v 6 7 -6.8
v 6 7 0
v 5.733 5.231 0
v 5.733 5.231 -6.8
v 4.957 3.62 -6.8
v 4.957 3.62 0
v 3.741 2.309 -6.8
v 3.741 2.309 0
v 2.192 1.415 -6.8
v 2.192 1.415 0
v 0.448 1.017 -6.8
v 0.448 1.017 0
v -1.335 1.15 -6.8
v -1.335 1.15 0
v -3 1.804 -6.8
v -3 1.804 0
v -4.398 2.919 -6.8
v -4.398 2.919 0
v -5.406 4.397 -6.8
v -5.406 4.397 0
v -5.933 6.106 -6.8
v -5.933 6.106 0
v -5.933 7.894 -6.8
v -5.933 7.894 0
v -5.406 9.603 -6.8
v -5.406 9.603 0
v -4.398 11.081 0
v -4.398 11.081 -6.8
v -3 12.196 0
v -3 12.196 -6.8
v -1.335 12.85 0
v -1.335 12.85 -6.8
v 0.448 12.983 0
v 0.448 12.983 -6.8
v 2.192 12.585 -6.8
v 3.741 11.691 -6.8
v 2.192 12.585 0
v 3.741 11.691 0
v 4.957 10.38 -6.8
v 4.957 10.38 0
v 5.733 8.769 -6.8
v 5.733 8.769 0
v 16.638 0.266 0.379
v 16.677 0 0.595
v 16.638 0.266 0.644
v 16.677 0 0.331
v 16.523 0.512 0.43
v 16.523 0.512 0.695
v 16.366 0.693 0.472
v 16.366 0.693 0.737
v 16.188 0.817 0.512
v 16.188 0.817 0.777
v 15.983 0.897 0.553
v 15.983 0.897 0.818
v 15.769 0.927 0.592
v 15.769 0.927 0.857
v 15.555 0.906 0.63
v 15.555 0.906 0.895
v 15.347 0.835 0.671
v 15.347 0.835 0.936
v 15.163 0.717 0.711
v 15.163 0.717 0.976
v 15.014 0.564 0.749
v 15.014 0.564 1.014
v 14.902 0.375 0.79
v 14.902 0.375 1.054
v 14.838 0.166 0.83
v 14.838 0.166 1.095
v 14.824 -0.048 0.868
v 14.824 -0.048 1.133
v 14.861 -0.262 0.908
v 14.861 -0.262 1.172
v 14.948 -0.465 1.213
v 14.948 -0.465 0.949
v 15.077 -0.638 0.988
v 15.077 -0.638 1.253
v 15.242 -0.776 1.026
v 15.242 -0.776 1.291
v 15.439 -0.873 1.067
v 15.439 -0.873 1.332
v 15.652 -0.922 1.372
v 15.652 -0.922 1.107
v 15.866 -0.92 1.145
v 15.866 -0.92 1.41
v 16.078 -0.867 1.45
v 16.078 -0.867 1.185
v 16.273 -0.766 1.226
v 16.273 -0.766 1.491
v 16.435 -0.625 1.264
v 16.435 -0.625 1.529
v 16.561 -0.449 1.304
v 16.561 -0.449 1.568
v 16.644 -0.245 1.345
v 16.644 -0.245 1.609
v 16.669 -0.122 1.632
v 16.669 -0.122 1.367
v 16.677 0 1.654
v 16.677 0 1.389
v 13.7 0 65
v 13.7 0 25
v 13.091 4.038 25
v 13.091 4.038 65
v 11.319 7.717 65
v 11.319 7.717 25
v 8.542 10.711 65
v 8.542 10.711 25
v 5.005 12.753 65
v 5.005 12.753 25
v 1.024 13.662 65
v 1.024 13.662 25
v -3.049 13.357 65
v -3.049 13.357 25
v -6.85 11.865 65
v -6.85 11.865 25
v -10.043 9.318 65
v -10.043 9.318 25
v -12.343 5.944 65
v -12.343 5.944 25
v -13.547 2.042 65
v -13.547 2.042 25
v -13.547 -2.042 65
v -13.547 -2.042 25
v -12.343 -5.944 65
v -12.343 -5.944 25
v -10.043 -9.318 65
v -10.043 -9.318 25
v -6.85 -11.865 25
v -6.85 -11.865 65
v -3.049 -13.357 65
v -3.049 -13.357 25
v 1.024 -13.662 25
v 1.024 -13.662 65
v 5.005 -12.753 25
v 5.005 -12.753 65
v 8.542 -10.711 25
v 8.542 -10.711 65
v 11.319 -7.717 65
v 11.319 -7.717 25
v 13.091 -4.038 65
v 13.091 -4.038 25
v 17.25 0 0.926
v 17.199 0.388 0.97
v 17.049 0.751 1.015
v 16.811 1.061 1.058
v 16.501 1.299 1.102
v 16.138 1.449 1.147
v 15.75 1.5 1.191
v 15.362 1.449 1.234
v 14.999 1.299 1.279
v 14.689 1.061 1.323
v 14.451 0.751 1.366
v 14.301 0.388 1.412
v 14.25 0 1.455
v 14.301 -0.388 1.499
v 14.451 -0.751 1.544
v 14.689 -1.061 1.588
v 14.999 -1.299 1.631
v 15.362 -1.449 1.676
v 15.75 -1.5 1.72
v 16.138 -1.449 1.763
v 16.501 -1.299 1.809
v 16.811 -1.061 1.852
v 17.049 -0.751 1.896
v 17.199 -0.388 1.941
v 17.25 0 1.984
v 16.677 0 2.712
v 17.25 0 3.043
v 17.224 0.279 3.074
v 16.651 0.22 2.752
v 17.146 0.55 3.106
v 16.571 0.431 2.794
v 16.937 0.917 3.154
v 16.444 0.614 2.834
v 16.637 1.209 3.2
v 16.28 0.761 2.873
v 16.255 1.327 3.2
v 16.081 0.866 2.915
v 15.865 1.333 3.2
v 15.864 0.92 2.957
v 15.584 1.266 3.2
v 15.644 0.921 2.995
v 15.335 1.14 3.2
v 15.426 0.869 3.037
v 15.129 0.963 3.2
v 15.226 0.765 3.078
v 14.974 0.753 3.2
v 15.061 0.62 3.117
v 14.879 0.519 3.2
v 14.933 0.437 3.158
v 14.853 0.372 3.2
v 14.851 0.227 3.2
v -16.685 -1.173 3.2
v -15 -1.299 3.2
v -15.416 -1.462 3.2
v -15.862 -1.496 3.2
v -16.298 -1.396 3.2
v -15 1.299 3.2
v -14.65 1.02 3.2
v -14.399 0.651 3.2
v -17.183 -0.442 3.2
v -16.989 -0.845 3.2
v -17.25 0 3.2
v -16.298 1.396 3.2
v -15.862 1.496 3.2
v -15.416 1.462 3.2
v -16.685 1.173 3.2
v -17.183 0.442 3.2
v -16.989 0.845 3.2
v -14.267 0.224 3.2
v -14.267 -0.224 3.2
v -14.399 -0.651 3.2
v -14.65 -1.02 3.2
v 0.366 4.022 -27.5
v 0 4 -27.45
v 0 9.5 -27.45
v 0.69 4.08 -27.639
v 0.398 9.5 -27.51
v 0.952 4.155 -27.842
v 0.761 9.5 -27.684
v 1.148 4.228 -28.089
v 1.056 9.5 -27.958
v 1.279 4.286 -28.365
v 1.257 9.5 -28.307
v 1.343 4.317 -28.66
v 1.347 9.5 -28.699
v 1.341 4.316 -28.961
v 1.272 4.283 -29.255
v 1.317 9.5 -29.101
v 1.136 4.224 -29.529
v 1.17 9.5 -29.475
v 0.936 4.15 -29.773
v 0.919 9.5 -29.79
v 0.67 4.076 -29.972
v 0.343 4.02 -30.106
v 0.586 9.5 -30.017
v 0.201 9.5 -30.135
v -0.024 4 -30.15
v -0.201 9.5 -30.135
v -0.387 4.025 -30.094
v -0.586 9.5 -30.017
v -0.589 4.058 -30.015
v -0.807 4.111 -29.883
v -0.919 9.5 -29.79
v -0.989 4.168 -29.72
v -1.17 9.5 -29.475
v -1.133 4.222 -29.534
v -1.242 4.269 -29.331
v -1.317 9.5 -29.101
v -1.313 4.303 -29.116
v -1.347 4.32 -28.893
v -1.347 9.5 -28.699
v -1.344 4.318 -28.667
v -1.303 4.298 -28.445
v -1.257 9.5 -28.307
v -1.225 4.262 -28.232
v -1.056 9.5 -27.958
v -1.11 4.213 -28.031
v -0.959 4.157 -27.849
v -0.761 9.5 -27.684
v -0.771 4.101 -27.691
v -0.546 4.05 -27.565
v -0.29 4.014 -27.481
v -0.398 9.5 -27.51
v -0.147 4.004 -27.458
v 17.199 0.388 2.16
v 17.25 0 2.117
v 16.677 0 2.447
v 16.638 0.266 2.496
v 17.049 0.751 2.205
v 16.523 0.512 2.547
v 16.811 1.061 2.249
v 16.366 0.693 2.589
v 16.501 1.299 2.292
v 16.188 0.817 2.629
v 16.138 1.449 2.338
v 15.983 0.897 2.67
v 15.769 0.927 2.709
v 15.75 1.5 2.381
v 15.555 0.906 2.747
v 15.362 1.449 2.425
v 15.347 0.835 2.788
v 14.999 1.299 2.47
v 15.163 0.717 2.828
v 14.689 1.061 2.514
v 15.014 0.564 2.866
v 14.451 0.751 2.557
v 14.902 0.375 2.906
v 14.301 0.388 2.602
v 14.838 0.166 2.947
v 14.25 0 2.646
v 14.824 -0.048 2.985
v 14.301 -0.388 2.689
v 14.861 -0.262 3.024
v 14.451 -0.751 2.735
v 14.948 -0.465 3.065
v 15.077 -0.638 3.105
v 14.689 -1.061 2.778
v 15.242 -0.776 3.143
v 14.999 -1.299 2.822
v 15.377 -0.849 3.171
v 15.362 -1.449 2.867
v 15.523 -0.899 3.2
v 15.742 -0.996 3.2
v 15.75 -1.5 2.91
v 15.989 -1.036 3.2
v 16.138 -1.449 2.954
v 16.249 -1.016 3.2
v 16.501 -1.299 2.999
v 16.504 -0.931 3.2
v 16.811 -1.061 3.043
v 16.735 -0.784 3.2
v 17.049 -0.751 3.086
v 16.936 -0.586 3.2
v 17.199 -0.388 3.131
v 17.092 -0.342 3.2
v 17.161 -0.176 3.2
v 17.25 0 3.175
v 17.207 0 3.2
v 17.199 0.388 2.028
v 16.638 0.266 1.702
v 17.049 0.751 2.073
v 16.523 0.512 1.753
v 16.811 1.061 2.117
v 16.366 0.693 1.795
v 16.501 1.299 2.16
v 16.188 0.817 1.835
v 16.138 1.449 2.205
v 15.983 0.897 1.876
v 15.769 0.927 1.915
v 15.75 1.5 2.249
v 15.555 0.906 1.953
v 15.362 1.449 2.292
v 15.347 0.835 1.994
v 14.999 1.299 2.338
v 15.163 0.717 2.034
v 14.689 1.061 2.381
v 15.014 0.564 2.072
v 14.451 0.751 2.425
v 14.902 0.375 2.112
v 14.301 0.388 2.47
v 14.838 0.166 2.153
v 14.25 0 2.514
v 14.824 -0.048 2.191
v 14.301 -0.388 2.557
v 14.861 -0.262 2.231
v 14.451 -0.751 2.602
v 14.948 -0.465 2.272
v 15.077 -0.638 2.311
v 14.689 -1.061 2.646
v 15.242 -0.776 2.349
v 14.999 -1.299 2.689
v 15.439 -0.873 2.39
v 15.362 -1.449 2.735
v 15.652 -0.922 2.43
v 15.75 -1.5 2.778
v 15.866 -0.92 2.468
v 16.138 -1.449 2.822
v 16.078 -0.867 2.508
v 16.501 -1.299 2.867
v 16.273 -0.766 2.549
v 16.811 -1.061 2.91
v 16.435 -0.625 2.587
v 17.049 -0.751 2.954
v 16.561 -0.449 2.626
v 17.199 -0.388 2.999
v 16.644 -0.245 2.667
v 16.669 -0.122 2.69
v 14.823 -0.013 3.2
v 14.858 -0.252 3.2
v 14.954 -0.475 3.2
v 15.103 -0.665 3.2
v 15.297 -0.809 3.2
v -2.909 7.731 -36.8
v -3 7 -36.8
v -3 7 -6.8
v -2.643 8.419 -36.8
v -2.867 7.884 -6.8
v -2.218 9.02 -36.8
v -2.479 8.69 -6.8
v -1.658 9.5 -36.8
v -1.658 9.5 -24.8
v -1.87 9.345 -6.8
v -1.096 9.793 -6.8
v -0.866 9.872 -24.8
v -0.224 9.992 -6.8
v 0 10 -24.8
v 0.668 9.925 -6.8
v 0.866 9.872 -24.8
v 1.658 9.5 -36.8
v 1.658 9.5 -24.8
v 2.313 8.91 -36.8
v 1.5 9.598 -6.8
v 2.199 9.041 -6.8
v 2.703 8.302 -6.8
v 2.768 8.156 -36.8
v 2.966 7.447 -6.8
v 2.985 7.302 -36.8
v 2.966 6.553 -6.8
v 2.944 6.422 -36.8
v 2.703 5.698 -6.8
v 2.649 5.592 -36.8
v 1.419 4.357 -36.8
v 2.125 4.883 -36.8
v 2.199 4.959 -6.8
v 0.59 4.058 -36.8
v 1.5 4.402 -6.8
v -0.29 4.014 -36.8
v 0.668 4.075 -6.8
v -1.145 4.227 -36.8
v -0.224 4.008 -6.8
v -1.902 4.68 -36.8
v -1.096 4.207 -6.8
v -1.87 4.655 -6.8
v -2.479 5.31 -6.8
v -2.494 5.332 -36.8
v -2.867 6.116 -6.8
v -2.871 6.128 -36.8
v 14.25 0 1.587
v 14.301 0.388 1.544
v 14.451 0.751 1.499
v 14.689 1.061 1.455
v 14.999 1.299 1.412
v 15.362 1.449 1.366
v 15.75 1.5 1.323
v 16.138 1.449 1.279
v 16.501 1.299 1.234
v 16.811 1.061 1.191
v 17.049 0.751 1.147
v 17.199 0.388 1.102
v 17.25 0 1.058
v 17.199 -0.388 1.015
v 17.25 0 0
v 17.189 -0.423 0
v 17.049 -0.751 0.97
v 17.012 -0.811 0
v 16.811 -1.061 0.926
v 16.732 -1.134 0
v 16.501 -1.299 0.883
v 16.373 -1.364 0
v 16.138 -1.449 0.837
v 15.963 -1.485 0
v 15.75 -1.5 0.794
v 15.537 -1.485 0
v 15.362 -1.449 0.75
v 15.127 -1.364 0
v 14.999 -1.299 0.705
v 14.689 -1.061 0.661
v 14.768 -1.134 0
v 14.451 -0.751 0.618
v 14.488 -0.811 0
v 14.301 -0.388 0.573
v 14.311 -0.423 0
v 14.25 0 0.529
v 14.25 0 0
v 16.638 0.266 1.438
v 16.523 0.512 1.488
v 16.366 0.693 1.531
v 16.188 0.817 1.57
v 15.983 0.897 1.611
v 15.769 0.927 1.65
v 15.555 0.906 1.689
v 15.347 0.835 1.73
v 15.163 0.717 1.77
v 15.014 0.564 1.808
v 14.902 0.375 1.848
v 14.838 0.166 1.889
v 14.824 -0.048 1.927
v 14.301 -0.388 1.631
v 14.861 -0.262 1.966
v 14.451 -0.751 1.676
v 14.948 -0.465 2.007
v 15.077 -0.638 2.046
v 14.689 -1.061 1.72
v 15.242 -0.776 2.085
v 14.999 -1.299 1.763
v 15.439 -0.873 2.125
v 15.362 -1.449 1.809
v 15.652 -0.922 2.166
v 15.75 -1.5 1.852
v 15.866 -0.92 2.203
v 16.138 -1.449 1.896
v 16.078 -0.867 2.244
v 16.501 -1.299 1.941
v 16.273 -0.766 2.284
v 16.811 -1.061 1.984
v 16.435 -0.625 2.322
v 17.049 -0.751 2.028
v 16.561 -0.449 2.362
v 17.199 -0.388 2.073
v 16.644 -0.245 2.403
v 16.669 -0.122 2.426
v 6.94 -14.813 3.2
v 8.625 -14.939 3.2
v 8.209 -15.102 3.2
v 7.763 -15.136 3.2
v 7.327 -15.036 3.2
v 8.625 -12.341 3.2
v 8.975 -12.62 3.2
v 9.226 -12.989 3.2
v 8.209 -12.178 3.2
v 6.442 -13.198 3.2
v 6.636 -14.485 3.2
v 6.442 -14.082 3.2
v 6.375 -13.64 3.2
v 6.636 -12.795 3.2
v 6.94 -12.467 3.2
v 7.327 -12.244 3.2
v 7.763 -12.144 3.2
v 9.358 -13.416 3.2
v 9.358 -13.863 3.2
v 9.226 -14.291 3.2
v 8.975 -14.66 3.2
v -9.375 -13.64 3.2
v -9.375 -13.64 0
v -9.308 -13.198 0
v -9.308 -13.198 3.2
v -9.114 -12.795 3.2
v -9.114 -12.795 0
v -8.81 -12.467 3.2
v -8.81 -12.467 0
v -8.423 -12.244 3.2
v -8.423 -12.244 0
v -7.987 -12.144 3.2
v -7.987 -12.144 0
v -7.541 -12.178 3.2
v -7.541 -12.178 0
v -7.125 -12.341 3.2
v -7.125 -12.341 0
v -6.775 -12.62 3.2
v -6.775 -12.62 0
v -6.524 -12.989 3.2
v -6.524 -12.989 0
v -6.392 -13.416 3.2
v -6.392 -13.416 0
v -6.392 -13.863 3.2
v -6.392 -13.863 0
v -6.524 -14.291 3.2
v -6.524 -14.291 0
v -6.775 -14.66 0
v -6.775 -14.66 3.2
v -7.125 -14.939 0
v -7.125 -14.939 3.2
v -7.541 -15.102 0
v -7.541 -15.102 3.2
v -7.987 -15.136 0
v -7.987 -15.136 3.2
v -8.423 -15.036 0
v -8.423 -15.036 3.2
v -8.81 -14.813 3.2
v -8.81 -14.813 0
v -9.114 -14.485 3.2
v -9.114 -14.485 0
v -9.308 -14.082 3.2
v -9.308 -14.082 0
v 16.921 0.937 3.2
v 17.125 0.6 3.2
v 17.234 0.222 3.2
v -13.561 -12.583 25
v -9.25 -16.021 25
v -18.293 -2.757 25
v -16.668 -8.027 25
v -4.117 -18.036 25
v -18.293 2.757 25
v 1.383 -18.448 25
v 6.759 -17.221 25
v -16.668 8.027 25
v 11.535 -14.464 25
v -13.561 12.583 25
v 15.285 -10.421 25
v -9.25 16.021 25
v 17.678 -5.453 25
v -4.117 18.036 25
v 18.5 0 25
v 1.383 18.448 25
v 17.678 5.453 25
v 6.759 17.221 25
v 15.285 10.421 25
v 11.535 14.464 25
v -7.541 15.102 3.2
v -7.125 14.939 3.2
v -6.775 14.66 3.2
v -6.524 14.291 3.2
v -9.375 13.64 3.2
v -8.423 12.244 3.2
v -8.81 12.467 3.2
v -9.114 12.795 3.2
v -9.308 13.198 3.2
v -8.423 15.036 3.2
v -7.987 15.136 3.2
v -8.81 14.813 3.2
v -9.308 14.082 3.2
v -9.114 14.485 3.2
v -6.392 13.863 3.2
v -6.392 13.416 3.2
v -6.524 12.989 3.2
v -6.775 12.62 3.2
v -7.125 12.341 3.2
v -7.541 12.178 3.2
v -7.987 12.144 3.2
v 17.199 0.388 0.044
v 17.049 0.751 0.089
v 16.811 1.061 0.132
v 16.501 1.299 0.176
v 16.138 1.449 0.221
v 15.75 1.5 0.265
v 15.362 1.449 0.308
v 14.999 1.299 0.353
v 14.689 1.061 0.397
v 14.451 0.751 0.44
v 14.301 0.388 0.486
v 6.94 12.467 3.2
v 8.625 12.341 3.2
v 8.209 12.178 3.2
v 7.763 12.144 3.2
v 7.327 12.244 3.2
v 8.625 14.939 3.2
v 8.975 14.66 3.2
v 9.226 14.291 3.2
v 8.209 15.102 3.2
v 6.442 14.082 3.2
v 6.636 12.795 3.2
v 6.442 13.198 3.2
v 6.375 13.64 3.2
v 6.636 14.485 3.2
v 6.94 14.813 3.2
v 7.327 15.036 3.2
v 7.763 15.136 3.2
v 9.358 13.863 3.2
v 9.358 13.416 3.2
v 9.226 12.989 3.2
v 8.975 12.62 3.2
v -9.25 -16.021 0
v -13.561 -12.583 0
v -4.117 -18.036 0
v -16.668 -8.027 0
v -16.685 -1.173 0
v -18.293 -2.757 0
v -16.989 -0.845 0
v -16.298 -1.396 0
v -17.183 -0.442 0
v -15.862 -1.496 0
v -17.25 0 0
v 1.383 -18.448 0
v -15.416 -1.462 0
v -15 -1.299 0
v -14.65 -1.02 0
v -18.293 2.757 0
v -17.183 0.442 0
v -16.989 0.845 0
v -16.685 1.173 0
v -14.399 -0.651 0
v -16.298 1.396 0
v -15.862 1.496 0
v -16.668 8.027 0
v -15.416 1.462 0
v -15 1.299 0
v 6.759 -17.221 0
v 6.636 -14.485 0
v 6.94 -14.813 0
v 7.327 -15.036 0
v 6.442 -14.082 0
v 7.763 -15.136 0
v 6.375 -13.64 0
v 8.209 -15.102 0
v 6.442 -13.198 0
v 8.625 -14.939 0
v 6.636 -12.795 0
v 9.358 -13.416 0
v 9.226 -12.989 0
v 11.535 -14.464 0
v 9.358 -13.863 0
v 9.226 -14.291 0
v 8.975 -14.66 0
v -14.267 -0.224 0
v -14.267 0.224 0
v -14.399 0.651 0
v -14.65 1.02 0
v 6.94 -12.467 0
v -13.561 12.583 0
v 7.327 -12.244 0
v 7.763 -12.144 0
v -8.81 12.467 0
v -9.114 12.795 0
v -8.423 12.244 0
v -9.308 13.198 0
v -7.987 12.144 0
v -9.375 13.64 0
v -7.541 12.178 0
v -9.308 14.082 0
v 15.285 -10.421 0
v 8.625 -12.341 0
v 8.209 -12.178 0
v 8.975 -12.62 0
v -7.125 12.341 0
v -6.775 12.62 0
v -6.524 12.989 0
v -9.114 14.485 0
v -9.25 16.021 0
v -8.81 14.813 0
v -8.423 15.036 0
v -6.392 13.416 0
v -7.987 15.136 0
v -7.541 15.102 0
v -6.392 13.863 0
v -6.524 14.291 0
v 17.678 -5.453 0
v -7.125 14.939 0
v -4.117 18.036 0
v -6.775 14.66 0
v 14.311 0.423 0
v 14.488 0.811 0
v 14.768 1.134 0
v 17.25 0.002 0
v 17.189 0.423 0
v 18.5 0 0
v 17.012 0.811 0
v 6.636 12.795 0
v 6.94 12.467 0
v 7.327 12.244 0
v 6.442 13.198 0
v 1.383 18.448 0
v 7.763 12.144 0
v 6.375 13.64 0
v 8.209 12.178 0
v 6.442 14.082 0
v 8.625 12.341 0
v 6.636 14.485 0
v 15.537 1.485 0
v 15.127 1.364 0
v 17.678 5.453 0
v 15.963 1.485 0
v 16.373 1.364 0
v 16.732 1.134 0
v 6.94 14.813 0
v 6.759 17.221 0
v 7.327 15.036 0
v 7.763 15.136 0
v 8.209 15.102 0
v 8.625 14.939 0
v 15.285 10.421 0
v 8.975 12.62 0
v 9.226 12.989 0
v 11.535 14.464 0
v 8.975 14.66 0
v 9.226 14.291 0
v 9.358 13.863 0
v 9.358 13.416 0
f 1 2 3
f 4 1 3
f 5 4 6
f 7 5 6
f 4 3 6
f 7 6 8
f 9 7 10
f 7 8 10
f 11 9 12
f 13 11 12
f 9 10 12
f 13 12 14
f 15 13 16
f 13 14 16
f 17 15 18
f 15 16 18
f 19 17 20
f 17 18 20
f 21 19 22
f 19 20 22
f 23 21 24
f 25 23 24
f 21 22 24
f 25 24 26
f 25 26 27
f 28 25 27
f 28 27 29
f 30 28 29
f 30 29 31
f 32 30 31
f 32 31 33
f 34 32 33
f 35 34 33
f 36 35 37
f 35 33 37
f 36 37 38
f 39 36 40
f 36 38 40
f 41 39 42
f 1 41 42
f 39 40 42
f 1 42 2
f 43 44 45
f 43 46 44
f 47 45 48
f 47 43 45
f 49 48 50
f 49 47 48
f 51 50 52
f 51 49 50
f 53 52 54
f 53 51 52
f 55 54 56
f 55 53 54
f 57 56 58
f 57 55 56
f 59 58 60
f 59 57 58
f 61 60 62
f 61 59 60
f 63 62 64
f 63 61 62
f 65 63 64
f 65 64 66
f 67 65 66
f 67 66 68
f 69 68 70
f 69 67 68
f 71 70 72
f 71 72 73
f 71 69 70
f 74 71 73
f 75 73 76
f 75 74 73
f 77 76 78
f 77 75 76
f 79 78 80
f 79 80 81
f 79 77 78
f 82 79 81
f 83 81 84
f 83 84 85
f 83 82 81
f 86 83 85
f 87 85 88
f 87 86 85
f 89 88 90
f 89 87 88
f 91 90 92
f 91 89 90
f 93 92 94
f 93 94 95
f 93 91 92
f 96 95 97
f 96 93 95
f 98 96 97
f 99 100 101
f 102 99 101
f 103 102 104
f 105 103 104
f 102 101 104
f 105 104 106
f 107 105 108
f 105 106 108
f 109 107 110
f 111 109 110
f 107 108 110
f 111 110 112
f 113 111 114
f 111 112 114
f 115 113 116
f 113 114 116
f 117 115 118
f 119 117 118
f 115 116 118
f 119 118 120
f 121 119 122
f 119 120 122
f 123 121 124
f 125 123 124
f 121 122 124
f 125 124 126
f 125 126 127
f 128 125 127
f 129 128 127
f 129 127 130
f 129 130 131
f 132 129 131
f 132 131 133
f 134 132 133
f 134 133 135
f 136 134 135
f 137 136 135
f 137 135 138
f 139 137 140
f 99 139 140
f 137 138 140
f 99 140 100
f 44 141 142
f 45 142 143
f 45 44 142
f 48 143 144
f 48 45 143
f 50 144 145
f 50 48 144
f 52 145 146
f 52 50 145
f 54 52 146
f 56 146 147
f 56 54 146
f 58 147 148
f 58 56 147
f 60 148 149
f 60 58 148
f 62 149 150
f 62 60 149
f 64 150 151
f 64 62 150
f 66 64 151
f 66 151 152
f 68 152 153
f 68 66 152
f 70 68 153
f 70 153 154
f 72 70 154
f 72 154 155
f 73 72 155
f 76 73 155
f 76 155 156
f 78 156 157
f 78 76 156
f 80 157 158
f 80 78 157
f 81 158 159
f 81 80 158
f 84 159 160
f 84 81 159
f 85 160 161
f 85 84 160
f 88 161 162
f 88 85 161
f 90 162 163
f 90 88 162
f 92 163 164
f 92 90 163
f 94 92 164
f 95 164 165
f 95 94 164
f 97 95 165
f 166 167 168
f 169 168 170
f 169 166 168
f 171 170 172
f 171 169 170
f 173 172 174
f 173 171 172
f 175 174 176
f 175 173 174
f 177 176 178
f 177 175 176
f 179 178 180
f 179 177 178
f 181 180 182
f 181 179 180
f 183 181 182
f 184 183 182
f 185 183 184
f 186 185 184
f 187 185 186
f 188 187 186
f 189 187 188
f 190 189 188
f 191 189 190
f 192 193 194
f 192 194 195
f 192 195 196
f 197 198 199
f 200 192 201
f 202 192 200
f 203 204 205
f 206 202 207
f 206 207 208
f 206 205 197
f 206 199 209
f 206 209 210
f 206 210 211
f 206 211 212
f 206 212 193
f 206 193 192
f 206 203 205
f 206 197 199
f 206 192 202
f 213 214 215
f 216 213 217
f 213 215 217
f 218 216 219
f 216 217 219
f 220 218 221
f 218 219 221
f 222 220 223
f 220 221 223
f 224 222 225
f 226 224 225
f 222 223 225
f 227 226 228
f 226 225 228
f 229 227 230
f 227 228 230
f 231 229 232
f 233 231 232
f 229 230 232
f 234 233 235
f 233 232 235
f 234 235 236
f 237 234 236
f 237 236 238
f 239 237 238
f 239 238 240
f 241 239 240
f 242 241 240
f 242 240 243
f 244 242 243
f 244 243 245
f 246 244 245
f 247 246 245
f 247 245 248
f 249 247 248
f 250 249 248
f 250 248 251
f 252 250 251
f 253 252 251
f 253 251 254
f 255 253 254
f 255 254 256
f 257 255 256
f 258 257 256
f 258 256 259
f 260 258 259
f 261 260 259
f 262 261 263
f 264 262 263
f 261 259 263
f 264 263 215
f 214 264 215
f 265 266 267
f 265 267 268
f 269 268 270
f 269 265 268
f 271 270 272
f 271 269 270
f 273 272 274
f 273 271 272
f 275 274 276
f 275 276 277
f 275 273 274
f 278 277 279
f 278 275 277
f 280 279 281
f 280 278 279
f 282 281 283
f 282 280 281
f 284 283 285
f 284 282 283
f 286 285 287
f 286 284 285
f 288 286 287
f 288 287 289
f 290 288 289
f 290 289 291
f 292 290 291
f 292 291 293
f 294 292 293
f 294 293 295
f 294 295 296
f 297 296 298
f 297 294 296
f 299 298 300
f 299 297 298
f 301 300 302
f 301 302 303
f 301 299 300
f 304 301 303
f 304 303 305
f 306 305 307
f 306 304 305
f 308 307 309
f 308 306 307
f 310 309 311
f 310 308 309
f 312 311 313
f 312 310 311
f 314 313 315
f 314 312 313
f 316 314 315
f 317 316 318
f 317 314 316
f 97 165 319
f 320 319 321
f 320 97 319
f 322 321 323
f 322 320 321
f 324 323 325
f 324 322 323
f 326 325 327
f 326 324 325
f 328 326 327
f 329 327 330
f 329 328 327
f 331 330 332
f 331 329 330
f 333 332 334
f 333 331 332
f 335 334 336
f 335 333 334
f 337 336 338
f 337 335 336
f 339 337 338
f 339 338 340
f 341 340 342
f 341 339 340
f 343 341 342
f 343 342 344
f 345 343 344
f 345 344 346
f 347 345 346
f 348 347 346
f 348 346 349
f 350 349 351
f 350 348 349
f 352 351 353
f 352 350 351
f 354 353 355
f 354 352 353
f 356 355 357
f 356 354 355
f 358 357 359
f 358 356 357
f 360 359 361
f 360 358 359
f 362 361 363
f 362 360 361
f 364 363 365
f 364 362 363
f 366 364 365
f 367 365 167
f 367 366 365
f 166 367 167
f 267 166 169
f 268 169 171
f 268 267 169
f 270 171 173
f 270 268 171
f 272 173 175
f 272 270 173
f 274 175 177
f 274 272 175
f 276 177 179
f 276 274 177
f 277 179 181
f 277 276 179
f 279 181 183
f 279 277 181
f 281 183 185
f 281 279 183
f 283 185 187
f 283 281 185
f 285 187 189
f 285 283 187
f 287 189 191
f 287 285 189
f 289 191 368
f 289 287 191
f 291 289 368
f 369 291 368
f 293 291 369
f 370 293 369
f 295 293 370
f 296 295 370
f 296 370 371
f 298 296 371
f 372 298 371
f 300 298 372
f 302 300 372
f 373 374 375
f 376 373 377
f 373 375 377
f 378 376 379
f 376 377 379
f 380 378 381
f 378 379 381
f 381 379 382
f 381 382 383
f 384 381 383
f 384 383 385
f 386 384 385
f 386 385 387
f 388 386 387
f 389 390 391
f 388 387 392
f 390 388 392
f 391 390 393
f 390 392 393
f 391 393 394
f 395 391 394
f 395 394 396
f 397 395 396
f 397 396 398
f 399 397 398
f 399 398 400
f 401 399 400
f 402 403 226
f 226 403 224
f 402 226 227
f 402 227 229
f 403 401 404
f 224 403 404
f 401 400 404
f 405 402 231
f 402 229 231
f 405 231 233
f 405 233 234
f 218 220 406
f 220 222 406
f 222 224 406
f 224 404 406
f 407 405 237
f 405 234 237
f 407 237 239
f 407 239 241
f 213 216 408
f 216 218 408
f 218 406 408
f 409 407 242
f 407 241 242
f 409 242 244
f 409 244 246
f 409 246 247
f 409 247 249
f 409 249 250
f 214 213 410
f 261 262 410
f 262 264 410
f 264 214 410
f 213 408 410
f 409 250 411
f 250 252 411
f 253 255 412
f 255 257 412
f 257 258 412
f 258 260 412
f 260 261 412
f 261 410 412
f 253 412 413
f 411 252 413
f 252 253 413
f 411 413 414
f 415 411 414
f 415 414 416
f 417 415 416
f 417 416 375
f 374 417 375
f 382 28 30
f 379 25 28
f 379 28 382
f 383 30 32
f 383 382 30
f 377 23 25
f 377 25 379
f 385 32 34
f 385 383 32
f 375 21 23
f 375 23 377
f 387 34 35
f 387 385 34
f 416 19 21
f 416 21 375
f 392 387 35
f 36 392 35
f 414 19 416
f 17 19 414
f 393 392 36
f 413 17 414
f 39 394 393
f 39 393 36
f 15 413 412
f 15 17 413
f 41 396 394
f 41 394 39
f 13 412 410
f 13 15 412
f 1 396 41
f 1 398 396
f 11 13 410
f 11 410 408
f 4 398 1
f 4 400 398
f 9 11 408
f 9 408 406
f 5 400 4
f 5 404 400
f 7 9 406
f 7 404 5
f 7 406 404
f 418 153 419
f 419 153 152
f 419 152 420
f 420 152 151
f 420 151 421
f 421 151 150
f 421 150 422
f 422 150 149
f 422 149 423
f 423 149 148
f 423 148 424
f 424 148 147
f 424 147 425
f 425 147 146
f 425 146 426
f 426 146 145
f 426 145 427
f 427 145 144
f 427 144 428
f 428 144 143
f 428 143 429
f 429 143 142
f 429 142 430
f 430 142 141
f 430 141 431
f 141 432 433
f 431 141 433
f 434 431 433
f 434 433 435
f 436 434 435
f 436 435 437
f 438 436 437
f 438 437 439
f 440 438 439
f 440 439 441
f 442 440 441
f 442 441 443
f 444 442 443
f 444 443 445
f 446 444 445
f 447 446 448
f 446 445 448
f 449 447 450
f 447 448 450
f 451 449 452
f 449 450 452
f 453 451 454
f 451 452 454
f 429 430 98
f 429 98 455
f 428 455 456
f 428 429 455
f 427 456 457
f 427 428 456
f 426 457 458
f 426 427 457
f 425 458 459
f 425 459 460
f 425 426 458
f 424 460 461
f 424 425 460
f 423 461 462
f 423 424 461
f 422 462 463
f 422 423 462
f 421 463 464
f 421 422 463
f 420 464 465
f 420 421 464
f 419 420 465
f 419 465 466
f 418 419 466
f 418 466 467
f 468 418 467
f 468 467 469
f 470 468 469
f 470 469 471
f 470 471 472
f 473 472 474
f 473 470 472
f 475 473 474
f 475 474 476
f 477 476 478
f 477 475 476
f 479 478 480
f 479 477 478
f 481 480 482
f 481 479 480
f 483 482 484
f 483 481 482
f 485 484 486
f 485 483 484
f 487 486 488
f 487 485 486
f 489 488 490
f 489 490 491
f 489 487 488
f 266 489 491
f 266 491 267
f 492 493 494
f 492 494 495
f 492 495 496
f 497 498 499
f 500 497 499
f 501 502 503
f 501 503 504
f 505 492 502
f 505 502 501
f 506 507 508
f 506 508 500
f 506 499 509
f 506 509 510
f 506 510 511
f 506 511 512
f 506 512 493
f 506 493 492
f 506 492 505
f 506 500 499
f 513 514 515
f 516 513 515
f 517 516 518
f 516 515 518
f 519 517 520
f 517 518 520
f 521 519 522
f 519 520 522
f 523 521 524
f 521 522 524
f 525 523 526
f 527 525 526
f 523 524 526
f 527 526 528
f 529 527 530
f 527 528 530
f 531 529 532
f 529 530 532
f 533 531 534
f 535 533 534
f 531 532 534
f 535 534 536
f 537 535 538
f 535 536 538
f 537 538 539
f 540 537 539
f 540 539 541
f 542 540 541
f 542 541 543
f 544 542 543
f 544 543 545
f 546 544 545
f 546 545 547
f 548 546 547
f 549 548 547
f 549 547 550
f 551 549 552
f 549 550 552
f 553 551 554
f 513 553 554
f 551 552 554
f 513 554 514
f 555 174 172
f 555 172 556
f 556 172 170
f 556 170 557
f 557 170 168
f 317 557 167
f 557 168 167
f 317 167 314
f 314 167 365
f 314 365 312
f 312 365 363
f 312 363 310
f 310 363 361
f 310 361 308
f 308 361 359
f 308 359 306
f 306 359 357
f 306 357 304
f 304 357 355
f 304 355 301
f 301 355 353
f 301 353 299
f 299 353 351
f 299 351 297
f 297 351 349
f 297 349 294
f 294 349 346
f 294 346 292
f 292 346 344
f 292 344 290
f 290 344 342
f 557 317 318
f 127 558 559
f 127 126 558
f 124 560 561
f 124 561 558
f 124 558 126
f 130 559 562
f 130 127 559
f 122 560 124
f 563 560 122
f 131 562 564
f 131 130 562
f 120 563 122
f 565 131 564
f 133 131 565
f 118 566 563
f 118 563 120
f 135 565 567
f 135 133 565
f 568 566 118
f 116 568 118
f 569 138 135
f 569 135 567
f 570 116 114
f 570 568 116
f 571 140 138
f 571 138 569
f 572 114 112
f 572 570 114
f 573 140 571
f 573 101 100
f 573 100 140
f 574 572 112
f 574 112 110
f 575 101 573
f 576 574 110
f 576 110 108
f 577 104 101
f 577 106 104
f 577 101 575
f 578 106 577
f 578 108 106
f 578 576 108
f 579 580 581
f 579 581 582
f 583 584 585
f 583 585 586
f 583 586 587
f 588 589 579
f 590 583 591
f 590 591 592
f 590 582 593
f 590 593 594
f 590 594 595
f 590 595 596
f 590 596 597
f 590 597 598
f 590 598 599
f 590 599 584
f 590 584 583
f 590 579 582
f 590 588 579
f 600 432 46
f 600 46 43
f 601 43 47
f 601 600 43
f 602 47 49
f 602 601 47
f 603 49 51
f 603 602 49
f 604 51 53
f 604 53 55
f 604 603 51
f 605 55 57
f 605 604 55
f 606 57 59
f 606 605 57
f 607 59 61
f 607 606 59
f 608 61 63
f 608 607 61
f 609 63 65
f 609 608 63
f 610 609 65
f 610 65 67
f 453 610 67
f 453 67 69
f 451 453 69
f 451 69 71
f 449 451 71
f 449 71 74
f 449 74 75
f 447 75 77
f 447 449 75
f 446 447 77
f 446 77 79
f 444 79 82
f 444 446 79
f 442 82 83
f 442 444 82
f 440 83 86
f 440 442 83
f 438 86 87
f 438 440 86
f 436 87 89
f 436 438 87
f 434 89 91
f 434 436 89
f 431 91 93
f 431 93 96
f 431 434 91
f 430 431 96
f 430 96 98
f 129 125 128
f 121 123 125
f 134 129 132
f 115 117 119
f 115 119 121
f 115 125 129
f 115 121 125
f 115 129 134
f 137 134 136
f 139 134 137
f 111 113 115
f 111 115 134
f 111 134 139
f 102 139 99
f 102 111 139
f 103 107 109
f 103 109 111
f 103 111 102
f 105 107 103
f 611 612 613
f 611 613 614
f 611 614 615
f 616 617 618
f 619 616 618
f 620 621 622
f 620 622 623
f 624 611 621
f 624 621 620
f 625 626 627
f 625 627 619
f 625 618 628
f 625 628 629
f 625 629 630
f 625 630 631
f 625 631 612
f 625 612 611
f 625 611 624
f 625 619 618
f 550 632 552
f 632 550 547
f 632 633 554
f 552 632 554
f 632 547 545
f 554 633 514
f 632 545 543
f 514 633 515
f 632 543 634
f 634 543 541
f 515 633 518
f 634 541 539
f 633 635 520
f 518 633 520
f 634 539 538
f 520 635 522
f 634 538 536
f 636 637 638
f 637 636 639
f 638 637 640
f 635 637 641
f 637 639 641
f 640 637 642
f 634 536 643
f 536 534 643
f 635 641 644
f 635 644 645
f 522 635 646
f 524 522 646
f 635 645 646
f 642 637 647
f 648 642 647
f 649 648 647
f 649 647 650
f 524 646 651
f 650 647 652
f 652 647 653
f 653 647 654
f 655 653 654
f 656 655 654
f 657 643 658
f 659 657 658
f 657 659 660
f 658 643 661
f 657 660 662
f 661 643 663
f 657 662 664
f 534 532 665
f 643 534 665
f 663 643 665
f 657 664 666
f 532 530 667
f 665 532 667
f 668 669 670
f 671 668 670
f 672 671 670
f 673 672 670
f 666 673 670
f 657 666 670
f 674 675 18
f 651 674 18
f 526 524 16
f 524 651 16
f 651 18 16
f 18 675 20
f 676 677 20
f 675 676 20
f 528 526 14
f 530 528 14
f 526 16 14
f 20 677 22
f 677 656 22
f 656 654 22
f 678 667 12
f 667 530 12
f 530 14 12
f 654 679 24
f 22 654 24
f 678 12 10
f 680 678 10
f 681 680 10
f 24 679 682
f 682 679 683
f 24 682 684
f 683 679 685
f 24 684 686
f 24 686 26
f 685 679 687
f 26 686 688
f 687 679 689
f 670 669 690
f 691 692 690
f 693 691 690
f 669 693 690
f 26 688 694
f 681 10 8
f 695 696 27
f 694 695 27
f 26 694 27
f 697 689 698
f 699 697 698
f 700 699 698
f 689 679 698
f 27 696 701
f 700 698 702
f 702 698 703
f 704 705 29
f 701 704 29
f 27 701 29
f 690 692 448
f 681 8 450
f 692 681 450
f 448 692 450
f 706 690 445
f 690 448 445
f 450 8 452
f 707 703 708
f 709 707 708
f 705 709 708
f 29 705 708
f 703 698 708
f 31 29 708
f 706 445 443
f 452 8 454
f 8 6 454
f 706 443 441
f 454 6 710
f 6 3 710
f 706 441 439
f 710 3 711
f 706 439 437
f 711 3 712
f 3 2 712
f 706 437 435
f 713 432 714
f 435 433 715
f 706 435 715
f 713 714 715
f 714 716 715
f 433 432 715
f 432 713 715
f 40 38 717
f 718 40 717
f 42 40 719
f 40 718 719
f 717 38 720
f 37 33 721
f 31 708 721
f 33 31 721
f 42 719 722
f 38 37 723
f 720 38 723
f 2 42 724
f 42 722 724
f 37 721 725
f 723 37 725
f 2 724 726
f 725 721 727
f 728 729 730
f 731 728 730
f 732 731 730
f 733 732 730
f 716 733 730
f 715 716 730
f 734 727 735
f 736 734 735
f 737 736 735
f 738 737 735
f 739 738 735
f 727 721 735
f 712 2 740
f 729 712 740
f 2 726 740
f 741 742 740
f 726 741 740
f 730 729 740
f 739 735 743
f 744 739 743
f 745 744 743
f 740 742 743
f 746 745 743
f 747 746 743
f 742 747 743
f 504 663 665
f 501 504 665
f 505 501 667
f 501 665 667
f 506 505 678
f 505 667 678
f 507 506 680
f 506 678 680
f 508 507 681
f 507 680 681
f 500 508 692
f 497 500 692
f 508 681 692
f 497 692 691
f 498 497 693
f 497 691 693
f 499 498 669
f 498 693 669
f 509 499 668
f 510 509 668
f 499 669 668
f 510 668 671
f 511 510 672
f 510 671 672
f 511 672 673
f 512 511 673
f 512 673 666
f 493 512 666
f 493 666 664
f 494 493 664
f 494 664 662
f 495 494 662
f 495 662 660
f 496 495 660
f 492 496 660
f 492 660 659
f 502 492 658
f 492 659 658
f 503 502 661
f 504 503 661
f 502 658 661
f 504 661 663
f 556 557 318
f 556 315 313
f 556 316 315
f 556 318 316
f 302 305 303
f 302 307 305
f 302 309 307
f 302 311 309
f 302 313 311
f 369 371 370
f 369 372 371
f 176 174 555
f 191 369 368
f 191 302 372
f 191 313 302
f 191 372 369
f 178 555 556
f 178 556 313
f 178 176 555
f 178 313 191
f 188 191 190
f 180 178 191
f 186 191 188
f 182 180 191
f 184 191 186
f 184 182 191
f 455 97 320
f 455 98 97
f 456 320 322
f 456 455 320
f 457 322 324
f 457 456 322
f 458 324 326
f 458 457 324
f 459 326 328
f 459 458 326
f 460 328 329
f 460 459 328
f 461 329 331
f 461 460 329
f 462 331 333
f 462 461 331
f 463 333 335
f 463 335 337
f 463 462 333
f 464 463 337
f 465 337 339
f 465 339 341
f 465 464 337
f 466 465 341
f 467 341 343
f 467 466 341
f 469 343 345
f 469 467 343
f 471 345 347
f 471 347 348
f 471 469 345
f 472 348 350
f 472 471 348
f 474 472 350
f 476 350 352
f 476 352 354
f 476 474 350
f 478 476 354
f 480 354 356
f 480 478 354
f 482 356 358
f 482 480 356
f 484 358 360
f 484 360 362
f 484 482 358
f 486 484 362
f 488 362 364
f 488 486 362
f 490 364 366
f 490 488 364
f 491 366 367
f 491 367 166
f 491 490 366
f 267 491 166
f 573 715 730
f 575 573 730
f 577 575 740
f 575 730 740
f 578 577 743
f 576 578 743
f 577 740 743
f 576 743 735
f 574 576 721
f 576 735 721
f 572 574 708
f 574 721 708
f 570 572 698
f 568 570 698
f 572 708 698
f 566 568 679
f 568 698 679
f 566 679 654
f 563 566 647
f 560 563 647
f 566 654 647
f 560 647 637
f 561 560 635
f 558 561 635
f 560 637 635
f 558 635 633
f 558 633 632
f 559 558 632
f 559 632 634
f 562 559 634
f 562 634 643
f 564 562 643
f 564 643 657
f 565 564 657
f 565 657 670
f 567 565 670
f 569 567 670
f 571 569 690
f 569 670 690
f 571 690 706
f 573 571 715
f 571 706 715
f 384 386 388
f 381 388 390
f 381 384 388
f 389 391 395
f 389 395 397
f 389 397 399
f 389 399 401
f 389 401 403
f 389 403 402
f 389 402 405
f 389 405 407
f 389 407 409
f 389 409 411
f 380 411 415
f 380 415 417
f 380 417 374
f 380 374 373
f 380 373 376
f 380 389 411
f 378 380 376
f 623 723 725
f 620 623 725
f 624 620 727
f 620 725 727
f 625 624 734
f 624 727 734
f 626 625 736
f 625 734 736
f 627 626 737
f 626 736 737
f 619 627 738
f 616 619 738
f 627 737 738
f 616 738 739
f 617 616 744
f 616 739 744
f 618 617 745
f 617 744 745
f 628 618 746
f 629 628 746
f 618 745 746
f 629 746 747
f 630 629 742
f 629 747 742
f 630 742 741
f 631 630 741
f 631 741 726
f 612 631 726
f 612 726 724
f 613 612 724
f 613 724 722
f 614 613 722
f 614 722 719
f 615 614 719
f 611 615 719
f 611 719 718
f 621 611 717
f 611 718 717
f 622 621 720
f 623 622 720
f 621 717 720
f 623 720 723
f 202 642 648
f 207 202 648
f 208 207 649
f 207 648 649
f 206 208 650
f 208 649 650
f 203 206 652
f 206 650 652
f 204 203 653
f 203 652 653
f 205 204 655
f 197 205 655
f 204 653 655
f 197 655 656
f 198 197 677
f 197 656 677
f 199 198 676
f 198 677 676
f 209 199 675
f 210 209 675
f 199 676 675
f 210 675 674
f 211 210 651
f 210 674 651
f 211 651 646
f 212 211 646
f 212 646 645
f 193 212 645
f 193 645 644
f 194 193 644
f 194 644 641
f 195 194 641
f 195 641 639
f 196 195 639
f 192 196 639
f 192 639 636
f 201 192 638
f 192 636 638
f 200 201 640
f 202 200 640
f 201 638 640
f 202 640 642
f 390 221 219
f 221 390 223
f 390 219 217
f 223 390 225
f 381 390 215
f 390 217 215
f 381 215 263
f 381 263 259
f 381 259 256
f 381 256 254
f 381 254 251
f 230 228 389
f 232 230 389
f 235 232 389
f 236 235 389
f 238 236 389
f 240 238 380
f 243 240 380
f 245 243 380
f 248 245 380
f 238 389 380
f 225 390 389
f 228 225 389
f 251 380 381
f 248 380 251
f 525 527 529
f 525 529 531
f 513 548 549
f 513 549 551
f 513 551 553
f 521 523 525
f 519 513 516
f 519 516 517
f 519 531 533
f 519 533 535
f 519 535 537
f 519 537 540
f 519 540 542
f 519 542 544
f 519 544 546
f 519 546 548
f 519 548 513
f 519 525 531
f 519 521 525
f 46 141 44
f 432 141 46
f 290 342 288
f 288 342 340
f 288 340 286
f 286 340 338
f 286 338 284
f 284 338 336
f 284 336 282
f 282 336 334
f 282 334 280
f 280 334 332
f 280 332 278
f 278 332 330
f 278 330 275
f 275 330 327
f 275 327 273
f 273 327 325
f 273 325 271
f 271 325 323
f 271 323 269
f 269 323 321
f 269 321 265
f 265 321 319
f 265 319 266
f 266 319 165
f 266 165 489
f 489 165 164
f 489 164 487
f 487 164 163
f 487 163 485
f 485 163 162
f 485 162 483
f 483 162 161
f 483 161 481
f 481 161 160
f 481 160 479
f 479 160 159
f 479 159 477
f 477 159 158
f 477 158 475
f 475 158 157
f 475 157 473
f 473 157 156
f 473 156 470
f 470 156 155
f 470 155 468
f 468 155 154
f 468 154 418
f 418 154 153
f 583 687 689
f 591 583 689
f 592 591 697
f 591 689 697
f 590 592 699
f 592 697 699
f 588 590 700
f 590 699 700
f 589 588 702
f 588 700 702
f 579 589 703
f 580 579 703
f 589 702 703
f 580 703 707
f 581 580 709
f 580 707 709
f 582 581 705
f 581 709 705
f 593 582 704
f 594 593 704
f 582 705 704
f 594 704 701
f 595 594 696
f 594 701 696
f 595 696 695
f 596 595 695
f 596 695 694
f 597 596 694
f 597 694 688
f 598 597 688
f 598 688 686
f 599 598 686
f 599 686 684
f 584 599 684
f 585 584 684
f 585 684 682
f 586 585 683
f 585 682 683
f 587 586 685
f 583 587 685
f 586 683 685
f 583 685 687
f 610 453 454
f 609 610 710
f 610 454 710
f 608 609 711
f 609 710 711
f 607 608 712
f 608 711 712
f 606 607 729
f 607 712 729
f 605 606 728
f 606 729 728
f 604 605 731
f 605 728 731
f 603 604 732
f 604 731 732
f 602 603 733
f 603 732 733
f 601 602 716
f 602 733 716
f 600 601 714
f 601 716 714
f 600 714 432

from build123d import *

# Parameters (mm, degrees)
SKETCH1_R           = 18.5
BOSS_EXTRUDE1_DEPTH = 25
SKETCH2_R           = 6
BOSS_EXTRUDE2_DEPTH = 6.8
SKETCH3_R           = 3
BOSS_EXTRUDE3_DEPTH = 30
CUT_EXTRUDE1_DEPTH  = 12
SKETCH5_R           = 13.7
BOSS_EXTRUDE4_DEPTH = 40
SKETCH6_R           = 1.5
CUT_EXTRUDE2_DEPTH  = 3.2
THREAD1_PITCH       = 1.058333333
SKETCH7_R           = 1.350457069
CUT_EXTRUDE3_DEPTH  = 10


with BuildPart() as part:
    # Sketch1 → Boss-Extrude1 (new body)
    with BuildSketch(Plane.XY):
        Circle(SKETCH1_R)
    extrude(amount=BOSS_EXTRUDE1_DEPTH)

    # Sketch2 → Boss-Extrude2 (add)
    with BuildSketch(Plane(origin=(0, 0, 0), x_dir=(-1, 0, 0), z_dir=(0, 0, -1))):
        with Locations(Location((0, 7, 0), (0, 0, 180))):
            Circle(SKETCH2_R)
    extrude(amount=BOSS_EXTRUDE2_DEPTH)

    # Sketch3 → Boss-Extrude3 (add)
    with BuildSketch(Plane(origin=(0, 0, -6.8), x_dir=(-1, 0, 0), z_dir=(0, 0, -1))):
        with Locations((0, 7)):
            Circle(SKETCH3_R)
    extrude(amount=BOSS_EXTRUDE3_DEPTH)

    # Sketch4 → Cut-Extrude1 (cut)
    with BuildSketch(Plane(origin=(0, 0, -36.8), x_dir=(-1, 0, 0), z_dir=(0, 0, -1))):
        Polygon((-80.661429966, 9.5), (-1.658312395, 9.5), (1.658312395, 9.5), (80.661429966, 9.5), (80.661429966, 167.506235142), (-80.661429966, 167.506235142), align=None)
    extrude(amount=-CUT_EXTRUDE1_DEPTH, mode=Mode.SUBTRACT)

    # Sketch5 → Boss-Extrude4 (add)
    with BuildSketch(Plane.XY.offset(25)):
        Circle(SKETCH5_R)
    extrude(amount=BOSS_EXTRUDE4_DEPTH)

    # Sketch6 → Cut-Extrude2 (cut)
    with BuildSketch(Plane(origin=(0, 0, 0), x_dir=(-1, 0, 0), z_dir=(0, 0, -1))):
        with Locations((-15.75, 0)):
            Circle(SKETCH6_R)
        with Locations((-7.875, 13.63990011)):
            Circle(SKETCH6_R)
        with Locations((7.875, 13.63990011)):
            Circle(SKETCH6_R)
        with Locations((15.75, 0)):
            Circle(SKETCH6_R)
        with Locations((7.875, -13.63990011)):
            Circle(SKETCH6_R)
        with Locations((-7.875, -13.63990011)):
            Circle(SKETCH6_R)
    extrude(amount=-CUT_EXTRUDE2_DEPTH, mode=Mode.SUBTRACT)

    # Thread1: the profile of Thread Profile1 profile screwed along a right-hand helix of 3.023622 turns, 8 arcs to a turn; built about Z, then put on its axis
    thread1_z = Axis((0, 0, 0), (0, 0, 1))
    thread1_corners = [(1.5003, 0, -0.000173205), (1.5003, 0, 0.926214869), (0.927160282, 0, 0.595312499), (0.927160282, 0, 0.330729165)]
    with BuildLine(mode=Mode.PRIVATE) as thread1_profile:
        Line(thread1_corners[0], thread1_corners[1])
        Line(thread1_corners[1], thread1_corners[2])
        Line(thread1_corners[2], thread1_corners[3])
        Line(thread1_corners[3], thread1_corners[0])
    thread1_cap = Face(thread1_profile.wire())
    thread1_turn_angles = [0, 22.5, 45, 67.5, 90, 112.5, 135, 157.5, 180, 202.5, 225, 247.5, 270, 292.5, 315, 337.5, 360]
    thread1_turn_weights = [1, 0.9238795325112867, 1, 0.9238795325112867, 1, 0.9238795325112867, 1, 0.9238795325112867, 1, 0.9238795325112867, 1, 0.9238795325112867, 1, 0.9238795325112867, 1, 0.9238795325112867, 1]
    thread1_turn_rails = [Edge.make_bspline([Vector(p[0], p[1], 0).rotate(thread1_z, thread1_turn_angles[k]) / thread1_turn_weights[k] + Vector(0, 0, p[2] + THREAD1_PITCH * thread1_turn_angles[k] / 360) for k in range(17)], [0, 0, 0, 1, 1, 2, 2, 3, 3, 4, 4, 5, 5, 6, 6, 7, 7, 8, 8, 8], 2, thread1_turn_weights) for p in thread1_corners]
    thread1_turn_sides = [Face.make_surface_from_curves(thread1_turn_rails[p[0]], thread1_turn_rails[p[1]]) for p in [(0, 1), (1, 2), (2, 3), (3, 0)]]
    thread1_last_angles = [1080, 1084.251968504, 1088.503937008]
    thread1_last_weights = [1, 0.9972476383747746, 1]
    thread1_last_rails = [Edge.make_bspline([Vector(p[0], p[1], 0).rotate(thread1_z, thread1_last_angles[k]) / thread1_last_weights[k] + Vector(0, 0, p[2] + THREAD1_PITCH * thread1_last_angles[k] / 360) for k in range(3)], [0, 0, 0, 1, 1, 1], 2, thread1_last_weights) for p in thread1_corners]
    thread1_last_sides = [Face.make_surface_from_curves(thread1_last_rails[p[0]], thread1_last_rails[p[1]]) for p in [(0, 1), (1, 2), (2, 3), (3, 0)]]
    thread1 = Plane(origin=(15.75, 0, 0), x_dir=(1, 0, 0), z_dir=(0, 0, 1)) * Solid(Shell([*[p.moved(Location((0, 0, THREAD1_PITCH * i))) for i in range(3) for p in thread1_turn_sides], *thread1_last_sides, thread1_cap, thread1_cap.rotate(thread1_z, 1088.503937008).moved(Location((0, 0, THREAD1_PITCH * 1088.503937008 / 360)))]))
    add(thread1)

    # Sketch7 → Cut-Extrude3 (cut)
    with BuildSketch(Plane(origin=(0, 9.5, 0), x_dir=(1, 0, 0), z_dir=(0, 1, 0))):
        with Locations(Location((0, 28.8, 0), (0, 0, 270))):
            Circle(SKETCH7_R)
    extrude(amount=-CUT_EXTRUDE3_DEPTH, mode=Mode.SUBTRACT)


solid = part.part
